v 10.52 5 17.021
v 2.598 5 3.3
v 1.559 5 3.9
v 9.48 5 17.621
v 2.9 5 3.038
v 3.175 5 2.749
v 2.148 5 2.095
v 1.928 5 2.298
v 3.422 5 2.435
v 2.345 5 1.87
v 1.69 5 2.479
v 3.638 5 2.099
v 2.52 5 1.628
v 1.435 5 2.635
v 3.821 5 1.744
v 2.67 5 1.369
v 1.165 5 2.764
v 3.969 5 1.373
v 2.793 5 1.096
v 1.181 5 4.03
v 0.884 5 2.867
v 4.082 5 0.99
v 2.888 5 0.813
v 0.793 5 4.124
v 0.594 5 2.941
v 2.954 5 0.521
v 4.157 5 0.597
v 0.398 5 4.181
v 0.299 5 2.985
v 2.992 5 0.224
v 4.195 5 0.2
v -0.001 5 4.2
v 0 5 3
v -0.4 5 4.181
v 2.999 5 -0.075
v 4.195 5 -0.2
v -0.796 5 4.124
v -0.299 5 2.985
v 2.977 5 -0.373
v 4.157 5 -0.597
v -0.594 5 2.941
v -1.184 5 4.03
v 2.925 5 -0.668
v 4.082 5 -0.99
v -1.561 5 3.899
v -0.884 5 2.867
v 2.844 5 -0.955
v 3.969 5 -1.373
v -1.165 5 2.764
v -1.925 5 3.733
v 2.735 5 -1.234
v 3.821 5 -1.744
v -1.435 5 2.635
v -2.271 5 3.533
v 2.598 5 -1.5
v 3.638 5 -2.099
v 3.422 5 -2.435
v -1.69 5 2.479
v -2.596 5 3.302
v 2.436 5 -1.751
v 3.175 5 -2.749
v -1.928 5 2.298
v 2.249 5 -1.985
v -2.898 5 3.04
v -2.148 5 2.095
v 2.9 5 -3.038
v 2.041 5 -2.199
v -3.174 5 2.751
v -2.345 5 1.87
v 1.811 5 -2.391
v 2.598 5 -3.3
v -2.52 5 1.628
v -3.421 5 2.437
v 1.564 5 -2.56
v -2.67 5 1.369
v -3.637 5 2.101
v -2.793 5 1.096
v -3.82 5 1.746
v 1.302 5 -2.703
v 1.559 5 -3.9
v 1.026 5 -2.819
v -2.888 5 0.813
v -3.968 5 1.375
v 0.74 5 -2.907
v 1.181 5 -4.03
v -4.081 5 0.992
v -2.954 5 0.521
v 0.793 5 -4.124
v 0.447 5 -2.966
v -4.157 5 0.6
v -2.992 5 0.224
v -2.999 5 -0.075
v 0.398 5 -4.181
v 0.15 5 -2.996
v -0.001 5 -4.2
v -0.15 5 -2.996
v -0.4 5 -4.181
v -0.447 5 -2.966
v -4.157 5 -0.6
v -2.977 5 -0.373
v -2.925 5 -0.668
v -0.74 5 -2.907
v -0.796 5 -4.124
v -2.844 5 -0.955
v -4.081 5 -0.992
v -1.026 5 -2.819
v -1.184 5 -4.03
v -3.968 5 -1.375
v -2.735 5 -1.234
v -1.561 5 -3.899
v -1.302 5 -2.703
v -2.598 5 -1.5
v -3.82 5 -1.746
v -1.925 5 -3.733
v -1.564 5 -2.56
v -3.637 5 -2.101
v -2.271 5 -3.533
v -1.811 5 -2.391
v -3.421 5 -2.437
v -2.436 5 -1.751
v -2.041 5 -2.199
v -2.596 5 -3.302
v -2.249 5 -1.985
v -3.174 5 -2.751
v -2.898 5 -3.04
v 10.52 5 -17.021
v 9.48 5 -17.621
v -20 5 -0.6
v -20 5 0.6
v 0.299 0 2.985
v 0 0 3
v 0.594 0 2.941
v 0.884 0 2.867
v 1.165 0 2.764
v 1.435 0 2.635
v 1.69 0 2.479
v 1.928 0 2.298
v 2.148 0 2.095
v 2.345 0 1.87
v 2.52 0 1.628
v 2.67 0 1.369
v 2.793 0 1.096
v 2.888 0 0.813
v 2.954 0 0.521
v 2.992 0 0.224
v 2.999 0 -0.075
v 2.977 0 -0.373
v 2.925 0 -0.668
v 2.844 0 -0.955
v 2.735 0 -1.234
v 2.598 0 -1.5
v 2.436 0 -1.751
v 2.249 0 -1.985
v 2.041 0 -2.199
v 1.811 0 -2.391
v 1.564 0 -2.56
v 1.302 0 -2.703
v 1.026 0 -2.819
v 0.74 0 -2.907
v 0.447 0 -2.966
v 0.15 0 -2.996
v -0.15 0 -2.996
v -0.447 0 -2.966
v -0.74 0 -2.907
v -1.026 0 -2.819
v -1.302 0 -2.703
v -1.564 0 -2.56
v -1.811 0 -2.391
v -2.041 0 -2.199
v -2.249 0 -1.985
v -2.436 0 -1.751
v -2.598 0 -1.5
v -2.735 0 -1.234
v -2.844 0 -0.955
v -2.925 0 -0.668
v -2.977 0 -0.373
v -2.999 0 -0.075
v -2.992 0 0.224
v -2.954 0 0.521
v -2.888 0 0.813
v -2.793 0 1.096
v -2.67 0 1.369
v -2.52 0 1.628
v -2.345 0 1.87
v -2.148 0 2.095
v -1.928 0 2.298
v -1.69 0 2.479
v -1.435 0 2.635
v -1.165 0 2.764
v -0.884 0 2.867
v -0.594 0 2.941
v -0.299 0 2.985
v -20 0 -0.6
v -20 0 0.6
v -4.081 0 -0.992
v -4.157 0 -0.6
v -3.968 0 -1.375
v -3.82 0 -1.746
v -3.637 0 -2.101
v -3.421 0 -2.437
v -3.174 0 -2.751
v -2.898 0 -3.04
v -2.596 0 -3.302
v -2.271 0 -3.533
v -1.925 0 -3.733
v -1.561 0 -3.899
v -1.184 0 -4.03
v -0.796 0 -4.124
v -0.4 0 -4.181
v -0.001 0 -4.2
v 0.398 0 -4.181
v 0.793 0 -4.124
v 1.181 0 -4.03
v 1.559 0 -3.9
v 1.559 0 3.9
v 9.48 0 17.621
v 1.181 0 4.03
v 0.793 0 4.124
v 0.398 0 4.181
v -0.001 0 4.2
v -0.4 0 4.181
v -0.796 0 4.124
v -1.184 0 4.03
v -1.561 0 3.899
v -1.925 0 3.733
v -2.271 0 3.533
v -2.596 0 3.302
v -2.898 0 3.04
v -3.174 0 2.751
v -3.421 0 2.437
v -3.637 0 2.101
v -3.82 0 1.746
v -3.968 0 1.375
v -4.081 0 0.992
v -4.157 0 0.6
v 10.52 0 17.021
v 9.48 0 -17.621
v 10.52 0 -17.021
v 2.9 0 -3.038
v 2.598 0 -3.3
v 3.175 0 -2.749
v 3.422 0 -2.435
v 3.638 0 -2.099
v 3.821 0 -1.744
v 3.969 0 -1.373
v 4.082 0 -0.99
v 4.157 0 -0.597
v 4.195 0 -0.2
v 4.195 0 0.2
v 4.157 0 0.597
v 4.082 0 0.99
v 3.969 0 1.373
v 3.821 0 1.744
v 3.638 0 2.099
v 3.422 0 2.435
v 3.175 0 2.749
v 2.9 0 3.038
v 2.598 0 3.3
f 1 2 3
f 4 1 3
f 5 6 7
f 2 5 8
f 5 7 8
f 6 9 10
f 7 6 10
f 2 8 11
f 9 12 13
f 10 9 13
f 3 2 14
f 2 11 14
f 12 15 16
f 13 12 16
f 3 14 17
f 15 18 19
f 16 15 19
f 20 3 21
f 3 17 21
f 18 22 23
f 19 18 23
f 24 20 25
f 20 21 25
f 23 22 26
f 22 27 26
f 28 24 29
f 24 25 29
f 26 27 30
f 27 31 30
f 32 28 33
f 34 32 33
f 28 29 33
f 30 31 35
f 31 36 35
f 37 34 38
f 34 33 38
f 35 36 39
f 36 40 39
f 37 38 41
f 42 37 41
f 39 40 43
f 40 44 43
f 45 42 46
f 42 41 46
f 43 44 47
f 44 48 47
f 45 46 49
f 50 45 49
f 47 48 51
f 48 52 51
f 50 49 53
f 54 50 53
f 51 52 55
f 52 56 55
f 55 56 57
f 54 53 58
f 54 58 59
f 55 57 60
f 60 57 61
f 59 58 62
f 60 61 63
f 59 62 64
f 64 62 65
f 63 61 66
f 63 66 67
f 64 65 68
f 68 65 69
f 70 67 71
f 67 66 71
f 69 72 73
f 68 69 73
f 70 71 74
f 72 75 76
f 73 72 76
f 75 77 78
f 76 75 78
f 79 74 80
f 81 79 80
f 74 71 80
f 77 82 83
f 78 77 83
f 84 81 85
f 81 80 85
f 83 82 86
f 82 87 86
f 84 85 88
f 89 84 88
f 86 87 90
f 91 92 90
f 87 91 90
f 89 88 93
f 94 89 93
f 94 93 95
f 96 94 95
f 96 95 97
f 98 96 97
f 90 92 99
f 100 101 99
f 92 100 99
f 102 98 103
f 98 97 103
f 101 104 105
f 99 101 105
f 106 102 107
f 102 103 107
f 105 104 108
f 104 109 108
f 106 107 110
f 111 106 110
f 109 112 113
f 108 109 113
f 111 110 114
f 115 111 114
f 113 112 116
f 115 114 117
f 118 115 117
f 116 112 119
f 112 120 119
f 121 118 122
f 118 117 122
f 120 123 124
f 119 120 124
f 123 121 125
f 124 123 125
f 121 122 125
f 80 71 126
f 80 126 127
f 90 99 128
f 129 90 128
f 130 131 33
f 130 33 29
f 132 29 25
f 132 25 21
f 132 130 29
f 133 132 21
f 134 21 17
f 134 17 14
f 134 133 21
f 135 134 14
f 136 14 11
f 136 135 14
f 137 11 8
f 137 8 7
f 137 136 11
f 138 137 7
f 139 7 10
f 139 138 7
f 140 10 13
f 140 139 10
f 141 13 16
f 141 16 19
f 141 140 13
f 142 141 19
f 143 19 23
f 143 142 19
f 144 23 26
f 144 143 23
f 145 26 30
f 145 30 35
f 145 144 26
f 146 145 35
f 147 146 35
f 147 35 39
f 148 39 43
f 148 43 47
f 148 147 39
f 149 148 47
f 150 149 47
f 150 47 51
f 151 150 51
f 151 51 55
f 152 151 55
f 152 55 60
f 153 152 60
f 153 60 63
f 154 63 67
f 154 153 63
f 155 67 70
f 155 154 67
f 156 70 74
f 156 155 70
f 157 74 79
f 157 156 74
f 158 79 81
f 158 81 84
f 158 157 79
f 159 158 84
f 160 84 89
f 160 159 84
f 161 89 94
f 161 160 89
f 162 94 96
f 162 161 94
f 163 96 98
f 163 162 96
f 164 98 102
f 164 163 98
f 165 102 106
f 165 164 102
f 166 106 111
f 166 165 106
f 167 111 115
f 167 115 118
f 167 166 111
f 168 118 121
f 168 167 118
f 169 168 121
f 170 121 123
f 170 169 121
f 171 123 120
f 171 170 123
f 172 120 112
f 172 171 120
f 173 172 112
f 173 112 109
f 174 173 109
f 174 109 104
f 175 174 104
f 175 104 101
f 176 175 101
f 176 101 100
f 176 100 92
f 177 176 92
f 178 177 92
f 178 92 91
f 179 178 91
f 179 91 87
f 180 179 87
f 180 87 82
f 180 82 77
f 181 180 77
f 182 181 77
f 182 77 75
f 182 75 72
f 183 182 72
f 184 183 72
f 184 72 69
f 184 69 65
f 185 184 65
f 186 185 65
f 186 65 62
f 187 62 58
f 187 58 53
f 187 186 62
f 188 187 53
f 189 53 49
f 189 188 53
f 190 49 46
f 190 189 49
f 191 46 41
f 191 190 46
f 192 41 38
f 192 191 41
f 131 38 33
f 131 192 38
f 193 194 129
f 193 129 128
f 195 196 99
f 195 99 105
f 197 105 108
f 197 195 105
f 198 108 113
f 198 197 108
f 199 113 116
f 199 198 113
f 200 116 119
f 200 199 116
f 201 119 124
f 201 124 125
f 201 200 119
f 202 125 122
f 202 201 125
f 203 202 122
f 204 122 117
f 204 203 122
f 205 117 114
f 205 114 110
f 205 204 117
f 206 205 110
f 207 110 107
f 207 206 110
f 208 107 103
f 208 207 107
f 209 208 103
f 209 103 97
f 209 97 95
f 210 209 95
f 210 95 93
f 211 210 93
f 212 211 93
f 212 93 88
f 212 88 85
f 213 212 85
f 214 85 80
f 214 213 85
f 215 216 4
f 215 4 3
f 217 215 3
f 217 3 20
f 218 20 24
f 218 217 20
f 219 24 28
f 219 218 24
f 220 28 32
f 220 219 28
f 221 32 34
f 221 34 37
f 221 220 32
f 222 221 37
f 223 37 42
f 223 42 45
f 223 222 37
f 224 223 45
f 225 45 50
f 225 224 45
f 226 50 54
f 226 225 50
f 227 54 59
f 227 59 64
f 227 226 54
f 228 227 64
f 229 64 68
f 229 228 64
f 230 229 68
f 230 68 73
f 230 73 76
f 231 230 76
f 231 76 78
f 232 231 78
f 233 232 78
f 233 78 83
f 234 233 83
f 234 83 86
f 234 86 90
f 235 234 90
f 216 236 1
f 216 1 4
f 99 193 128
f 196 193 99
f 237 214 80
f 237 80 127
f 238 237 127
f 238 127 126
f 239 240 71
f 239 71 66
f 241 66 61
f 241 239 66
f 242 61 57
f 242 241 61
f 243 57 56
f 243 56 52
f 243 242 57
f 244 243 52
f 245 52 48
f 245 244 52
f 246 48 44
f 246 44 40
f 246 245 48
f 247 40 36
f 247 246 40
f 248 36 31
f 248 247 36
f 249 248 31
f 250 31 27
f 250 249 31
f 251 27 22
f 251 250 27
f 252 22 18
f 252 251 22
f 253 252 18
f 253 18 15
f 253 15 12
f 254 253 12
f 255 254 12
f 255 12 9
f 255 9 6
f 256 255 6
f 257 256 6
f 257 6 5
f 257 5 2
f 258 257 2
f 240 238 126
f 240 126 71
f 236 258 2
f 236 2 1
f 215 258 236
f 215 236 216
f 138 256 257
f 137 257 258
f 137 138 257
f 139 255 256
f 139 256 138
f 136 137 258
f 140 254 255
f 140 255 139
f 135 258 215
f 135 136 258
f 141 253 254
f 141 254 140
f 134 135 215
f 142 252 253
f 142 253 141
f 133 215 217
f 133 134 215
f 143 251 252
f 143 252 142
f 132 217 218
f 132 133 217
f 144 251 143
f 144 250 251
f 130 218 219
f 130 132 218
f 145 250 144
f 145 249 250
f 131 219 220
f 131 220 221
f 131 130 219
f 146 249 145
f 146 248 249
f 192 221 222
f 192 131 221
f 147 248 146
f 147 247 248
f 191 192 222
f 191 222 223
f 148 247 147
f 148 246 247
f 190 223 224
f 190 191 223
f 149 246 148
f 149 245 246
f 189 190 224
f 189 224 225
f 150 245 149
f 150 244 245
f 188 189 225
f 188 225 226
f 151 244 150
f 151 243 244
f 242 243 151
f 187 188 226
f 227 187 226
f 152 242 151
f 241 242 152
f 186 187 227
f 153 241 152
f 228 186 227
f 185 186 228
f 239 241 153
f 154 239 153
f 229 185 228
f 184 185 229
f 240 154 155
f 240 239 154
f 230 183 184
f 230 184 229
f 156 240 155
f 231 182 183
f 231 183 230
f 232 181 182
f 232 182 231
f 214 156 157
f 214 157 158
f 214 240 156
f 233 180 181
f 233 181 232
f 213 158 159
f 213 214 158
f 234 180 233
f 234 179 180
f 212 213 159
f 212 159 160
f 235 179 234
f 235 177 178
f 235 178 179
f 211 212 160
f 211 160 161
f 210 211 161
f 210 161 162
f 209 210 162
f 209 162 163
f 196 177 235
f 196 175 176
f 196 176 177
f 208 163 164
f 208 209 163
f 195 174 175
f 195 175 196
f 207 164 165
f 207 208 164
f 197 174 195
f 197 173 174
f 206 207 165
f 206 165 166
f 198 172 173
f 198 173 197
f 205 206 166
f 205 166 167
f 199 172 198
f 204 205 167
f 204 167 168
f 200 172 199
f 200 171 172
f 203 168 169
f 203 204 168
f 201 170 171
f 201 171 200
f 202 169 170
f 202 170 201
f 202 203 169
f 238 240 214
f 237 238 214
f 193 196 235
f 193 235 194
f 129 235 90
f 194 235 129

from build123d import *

# Parameters (mm, degrees)
SKETCH1_R           = 3
BOSS_EXTRUDE2_DEPTH = 5


with BuildPart() as part:
    # Sketch1 → Boss-Extrude2 (new body)
    with BuildSketch(Plane(origin=(0, 0, 0), x_dir=(1, 0, 0), z_dir=(0, 1, 0))):
        with BuildLine():
            Line((-4.156921938, -0.6), (-20, -0.6))
            Line((-20, -0.6), (-20, 0.6))
            Line((-20, 0.6), (-4.156921938, 0.6))
            ThreePointArc((-4.156921938, 0.6), (-2.1, 3.637306696), (1.558845727, 3.9))
            Line((1.558845727, 3.9), (9.480384758, 17.620508076))
            Line((9.480384758, 17.620508076), (10.519615242, 17.020508076))
            Line((10.519615242, 17.020508076), (2.598076211, 3.3))
            ThreePointArc((2.598076211, 3.3), (4.2, 0), (2.598076211, -3.3))
            Line((2.598076211, -3.3), (10.519615242, -17.020508076))
            Line((10.519615242, -17.020508076), (9.480384758, -17.620508076))
            Line((9.480384758, -17.620508076), (1.558845727, -3.9))
            ThreePointArc((1.558845727, -3.9), (-2.1, -3.637306696), (-4.156921938, -0.6))
        make_face()
        with Locations(Location((0, 0, 0), (0, 0, 270))):
            Circle(SKETCH1_R, mode=Mode.SUBTRACT)
    extrude(amount=BOSS_EXTRUDE2_DEPTH)


solid = part.part
